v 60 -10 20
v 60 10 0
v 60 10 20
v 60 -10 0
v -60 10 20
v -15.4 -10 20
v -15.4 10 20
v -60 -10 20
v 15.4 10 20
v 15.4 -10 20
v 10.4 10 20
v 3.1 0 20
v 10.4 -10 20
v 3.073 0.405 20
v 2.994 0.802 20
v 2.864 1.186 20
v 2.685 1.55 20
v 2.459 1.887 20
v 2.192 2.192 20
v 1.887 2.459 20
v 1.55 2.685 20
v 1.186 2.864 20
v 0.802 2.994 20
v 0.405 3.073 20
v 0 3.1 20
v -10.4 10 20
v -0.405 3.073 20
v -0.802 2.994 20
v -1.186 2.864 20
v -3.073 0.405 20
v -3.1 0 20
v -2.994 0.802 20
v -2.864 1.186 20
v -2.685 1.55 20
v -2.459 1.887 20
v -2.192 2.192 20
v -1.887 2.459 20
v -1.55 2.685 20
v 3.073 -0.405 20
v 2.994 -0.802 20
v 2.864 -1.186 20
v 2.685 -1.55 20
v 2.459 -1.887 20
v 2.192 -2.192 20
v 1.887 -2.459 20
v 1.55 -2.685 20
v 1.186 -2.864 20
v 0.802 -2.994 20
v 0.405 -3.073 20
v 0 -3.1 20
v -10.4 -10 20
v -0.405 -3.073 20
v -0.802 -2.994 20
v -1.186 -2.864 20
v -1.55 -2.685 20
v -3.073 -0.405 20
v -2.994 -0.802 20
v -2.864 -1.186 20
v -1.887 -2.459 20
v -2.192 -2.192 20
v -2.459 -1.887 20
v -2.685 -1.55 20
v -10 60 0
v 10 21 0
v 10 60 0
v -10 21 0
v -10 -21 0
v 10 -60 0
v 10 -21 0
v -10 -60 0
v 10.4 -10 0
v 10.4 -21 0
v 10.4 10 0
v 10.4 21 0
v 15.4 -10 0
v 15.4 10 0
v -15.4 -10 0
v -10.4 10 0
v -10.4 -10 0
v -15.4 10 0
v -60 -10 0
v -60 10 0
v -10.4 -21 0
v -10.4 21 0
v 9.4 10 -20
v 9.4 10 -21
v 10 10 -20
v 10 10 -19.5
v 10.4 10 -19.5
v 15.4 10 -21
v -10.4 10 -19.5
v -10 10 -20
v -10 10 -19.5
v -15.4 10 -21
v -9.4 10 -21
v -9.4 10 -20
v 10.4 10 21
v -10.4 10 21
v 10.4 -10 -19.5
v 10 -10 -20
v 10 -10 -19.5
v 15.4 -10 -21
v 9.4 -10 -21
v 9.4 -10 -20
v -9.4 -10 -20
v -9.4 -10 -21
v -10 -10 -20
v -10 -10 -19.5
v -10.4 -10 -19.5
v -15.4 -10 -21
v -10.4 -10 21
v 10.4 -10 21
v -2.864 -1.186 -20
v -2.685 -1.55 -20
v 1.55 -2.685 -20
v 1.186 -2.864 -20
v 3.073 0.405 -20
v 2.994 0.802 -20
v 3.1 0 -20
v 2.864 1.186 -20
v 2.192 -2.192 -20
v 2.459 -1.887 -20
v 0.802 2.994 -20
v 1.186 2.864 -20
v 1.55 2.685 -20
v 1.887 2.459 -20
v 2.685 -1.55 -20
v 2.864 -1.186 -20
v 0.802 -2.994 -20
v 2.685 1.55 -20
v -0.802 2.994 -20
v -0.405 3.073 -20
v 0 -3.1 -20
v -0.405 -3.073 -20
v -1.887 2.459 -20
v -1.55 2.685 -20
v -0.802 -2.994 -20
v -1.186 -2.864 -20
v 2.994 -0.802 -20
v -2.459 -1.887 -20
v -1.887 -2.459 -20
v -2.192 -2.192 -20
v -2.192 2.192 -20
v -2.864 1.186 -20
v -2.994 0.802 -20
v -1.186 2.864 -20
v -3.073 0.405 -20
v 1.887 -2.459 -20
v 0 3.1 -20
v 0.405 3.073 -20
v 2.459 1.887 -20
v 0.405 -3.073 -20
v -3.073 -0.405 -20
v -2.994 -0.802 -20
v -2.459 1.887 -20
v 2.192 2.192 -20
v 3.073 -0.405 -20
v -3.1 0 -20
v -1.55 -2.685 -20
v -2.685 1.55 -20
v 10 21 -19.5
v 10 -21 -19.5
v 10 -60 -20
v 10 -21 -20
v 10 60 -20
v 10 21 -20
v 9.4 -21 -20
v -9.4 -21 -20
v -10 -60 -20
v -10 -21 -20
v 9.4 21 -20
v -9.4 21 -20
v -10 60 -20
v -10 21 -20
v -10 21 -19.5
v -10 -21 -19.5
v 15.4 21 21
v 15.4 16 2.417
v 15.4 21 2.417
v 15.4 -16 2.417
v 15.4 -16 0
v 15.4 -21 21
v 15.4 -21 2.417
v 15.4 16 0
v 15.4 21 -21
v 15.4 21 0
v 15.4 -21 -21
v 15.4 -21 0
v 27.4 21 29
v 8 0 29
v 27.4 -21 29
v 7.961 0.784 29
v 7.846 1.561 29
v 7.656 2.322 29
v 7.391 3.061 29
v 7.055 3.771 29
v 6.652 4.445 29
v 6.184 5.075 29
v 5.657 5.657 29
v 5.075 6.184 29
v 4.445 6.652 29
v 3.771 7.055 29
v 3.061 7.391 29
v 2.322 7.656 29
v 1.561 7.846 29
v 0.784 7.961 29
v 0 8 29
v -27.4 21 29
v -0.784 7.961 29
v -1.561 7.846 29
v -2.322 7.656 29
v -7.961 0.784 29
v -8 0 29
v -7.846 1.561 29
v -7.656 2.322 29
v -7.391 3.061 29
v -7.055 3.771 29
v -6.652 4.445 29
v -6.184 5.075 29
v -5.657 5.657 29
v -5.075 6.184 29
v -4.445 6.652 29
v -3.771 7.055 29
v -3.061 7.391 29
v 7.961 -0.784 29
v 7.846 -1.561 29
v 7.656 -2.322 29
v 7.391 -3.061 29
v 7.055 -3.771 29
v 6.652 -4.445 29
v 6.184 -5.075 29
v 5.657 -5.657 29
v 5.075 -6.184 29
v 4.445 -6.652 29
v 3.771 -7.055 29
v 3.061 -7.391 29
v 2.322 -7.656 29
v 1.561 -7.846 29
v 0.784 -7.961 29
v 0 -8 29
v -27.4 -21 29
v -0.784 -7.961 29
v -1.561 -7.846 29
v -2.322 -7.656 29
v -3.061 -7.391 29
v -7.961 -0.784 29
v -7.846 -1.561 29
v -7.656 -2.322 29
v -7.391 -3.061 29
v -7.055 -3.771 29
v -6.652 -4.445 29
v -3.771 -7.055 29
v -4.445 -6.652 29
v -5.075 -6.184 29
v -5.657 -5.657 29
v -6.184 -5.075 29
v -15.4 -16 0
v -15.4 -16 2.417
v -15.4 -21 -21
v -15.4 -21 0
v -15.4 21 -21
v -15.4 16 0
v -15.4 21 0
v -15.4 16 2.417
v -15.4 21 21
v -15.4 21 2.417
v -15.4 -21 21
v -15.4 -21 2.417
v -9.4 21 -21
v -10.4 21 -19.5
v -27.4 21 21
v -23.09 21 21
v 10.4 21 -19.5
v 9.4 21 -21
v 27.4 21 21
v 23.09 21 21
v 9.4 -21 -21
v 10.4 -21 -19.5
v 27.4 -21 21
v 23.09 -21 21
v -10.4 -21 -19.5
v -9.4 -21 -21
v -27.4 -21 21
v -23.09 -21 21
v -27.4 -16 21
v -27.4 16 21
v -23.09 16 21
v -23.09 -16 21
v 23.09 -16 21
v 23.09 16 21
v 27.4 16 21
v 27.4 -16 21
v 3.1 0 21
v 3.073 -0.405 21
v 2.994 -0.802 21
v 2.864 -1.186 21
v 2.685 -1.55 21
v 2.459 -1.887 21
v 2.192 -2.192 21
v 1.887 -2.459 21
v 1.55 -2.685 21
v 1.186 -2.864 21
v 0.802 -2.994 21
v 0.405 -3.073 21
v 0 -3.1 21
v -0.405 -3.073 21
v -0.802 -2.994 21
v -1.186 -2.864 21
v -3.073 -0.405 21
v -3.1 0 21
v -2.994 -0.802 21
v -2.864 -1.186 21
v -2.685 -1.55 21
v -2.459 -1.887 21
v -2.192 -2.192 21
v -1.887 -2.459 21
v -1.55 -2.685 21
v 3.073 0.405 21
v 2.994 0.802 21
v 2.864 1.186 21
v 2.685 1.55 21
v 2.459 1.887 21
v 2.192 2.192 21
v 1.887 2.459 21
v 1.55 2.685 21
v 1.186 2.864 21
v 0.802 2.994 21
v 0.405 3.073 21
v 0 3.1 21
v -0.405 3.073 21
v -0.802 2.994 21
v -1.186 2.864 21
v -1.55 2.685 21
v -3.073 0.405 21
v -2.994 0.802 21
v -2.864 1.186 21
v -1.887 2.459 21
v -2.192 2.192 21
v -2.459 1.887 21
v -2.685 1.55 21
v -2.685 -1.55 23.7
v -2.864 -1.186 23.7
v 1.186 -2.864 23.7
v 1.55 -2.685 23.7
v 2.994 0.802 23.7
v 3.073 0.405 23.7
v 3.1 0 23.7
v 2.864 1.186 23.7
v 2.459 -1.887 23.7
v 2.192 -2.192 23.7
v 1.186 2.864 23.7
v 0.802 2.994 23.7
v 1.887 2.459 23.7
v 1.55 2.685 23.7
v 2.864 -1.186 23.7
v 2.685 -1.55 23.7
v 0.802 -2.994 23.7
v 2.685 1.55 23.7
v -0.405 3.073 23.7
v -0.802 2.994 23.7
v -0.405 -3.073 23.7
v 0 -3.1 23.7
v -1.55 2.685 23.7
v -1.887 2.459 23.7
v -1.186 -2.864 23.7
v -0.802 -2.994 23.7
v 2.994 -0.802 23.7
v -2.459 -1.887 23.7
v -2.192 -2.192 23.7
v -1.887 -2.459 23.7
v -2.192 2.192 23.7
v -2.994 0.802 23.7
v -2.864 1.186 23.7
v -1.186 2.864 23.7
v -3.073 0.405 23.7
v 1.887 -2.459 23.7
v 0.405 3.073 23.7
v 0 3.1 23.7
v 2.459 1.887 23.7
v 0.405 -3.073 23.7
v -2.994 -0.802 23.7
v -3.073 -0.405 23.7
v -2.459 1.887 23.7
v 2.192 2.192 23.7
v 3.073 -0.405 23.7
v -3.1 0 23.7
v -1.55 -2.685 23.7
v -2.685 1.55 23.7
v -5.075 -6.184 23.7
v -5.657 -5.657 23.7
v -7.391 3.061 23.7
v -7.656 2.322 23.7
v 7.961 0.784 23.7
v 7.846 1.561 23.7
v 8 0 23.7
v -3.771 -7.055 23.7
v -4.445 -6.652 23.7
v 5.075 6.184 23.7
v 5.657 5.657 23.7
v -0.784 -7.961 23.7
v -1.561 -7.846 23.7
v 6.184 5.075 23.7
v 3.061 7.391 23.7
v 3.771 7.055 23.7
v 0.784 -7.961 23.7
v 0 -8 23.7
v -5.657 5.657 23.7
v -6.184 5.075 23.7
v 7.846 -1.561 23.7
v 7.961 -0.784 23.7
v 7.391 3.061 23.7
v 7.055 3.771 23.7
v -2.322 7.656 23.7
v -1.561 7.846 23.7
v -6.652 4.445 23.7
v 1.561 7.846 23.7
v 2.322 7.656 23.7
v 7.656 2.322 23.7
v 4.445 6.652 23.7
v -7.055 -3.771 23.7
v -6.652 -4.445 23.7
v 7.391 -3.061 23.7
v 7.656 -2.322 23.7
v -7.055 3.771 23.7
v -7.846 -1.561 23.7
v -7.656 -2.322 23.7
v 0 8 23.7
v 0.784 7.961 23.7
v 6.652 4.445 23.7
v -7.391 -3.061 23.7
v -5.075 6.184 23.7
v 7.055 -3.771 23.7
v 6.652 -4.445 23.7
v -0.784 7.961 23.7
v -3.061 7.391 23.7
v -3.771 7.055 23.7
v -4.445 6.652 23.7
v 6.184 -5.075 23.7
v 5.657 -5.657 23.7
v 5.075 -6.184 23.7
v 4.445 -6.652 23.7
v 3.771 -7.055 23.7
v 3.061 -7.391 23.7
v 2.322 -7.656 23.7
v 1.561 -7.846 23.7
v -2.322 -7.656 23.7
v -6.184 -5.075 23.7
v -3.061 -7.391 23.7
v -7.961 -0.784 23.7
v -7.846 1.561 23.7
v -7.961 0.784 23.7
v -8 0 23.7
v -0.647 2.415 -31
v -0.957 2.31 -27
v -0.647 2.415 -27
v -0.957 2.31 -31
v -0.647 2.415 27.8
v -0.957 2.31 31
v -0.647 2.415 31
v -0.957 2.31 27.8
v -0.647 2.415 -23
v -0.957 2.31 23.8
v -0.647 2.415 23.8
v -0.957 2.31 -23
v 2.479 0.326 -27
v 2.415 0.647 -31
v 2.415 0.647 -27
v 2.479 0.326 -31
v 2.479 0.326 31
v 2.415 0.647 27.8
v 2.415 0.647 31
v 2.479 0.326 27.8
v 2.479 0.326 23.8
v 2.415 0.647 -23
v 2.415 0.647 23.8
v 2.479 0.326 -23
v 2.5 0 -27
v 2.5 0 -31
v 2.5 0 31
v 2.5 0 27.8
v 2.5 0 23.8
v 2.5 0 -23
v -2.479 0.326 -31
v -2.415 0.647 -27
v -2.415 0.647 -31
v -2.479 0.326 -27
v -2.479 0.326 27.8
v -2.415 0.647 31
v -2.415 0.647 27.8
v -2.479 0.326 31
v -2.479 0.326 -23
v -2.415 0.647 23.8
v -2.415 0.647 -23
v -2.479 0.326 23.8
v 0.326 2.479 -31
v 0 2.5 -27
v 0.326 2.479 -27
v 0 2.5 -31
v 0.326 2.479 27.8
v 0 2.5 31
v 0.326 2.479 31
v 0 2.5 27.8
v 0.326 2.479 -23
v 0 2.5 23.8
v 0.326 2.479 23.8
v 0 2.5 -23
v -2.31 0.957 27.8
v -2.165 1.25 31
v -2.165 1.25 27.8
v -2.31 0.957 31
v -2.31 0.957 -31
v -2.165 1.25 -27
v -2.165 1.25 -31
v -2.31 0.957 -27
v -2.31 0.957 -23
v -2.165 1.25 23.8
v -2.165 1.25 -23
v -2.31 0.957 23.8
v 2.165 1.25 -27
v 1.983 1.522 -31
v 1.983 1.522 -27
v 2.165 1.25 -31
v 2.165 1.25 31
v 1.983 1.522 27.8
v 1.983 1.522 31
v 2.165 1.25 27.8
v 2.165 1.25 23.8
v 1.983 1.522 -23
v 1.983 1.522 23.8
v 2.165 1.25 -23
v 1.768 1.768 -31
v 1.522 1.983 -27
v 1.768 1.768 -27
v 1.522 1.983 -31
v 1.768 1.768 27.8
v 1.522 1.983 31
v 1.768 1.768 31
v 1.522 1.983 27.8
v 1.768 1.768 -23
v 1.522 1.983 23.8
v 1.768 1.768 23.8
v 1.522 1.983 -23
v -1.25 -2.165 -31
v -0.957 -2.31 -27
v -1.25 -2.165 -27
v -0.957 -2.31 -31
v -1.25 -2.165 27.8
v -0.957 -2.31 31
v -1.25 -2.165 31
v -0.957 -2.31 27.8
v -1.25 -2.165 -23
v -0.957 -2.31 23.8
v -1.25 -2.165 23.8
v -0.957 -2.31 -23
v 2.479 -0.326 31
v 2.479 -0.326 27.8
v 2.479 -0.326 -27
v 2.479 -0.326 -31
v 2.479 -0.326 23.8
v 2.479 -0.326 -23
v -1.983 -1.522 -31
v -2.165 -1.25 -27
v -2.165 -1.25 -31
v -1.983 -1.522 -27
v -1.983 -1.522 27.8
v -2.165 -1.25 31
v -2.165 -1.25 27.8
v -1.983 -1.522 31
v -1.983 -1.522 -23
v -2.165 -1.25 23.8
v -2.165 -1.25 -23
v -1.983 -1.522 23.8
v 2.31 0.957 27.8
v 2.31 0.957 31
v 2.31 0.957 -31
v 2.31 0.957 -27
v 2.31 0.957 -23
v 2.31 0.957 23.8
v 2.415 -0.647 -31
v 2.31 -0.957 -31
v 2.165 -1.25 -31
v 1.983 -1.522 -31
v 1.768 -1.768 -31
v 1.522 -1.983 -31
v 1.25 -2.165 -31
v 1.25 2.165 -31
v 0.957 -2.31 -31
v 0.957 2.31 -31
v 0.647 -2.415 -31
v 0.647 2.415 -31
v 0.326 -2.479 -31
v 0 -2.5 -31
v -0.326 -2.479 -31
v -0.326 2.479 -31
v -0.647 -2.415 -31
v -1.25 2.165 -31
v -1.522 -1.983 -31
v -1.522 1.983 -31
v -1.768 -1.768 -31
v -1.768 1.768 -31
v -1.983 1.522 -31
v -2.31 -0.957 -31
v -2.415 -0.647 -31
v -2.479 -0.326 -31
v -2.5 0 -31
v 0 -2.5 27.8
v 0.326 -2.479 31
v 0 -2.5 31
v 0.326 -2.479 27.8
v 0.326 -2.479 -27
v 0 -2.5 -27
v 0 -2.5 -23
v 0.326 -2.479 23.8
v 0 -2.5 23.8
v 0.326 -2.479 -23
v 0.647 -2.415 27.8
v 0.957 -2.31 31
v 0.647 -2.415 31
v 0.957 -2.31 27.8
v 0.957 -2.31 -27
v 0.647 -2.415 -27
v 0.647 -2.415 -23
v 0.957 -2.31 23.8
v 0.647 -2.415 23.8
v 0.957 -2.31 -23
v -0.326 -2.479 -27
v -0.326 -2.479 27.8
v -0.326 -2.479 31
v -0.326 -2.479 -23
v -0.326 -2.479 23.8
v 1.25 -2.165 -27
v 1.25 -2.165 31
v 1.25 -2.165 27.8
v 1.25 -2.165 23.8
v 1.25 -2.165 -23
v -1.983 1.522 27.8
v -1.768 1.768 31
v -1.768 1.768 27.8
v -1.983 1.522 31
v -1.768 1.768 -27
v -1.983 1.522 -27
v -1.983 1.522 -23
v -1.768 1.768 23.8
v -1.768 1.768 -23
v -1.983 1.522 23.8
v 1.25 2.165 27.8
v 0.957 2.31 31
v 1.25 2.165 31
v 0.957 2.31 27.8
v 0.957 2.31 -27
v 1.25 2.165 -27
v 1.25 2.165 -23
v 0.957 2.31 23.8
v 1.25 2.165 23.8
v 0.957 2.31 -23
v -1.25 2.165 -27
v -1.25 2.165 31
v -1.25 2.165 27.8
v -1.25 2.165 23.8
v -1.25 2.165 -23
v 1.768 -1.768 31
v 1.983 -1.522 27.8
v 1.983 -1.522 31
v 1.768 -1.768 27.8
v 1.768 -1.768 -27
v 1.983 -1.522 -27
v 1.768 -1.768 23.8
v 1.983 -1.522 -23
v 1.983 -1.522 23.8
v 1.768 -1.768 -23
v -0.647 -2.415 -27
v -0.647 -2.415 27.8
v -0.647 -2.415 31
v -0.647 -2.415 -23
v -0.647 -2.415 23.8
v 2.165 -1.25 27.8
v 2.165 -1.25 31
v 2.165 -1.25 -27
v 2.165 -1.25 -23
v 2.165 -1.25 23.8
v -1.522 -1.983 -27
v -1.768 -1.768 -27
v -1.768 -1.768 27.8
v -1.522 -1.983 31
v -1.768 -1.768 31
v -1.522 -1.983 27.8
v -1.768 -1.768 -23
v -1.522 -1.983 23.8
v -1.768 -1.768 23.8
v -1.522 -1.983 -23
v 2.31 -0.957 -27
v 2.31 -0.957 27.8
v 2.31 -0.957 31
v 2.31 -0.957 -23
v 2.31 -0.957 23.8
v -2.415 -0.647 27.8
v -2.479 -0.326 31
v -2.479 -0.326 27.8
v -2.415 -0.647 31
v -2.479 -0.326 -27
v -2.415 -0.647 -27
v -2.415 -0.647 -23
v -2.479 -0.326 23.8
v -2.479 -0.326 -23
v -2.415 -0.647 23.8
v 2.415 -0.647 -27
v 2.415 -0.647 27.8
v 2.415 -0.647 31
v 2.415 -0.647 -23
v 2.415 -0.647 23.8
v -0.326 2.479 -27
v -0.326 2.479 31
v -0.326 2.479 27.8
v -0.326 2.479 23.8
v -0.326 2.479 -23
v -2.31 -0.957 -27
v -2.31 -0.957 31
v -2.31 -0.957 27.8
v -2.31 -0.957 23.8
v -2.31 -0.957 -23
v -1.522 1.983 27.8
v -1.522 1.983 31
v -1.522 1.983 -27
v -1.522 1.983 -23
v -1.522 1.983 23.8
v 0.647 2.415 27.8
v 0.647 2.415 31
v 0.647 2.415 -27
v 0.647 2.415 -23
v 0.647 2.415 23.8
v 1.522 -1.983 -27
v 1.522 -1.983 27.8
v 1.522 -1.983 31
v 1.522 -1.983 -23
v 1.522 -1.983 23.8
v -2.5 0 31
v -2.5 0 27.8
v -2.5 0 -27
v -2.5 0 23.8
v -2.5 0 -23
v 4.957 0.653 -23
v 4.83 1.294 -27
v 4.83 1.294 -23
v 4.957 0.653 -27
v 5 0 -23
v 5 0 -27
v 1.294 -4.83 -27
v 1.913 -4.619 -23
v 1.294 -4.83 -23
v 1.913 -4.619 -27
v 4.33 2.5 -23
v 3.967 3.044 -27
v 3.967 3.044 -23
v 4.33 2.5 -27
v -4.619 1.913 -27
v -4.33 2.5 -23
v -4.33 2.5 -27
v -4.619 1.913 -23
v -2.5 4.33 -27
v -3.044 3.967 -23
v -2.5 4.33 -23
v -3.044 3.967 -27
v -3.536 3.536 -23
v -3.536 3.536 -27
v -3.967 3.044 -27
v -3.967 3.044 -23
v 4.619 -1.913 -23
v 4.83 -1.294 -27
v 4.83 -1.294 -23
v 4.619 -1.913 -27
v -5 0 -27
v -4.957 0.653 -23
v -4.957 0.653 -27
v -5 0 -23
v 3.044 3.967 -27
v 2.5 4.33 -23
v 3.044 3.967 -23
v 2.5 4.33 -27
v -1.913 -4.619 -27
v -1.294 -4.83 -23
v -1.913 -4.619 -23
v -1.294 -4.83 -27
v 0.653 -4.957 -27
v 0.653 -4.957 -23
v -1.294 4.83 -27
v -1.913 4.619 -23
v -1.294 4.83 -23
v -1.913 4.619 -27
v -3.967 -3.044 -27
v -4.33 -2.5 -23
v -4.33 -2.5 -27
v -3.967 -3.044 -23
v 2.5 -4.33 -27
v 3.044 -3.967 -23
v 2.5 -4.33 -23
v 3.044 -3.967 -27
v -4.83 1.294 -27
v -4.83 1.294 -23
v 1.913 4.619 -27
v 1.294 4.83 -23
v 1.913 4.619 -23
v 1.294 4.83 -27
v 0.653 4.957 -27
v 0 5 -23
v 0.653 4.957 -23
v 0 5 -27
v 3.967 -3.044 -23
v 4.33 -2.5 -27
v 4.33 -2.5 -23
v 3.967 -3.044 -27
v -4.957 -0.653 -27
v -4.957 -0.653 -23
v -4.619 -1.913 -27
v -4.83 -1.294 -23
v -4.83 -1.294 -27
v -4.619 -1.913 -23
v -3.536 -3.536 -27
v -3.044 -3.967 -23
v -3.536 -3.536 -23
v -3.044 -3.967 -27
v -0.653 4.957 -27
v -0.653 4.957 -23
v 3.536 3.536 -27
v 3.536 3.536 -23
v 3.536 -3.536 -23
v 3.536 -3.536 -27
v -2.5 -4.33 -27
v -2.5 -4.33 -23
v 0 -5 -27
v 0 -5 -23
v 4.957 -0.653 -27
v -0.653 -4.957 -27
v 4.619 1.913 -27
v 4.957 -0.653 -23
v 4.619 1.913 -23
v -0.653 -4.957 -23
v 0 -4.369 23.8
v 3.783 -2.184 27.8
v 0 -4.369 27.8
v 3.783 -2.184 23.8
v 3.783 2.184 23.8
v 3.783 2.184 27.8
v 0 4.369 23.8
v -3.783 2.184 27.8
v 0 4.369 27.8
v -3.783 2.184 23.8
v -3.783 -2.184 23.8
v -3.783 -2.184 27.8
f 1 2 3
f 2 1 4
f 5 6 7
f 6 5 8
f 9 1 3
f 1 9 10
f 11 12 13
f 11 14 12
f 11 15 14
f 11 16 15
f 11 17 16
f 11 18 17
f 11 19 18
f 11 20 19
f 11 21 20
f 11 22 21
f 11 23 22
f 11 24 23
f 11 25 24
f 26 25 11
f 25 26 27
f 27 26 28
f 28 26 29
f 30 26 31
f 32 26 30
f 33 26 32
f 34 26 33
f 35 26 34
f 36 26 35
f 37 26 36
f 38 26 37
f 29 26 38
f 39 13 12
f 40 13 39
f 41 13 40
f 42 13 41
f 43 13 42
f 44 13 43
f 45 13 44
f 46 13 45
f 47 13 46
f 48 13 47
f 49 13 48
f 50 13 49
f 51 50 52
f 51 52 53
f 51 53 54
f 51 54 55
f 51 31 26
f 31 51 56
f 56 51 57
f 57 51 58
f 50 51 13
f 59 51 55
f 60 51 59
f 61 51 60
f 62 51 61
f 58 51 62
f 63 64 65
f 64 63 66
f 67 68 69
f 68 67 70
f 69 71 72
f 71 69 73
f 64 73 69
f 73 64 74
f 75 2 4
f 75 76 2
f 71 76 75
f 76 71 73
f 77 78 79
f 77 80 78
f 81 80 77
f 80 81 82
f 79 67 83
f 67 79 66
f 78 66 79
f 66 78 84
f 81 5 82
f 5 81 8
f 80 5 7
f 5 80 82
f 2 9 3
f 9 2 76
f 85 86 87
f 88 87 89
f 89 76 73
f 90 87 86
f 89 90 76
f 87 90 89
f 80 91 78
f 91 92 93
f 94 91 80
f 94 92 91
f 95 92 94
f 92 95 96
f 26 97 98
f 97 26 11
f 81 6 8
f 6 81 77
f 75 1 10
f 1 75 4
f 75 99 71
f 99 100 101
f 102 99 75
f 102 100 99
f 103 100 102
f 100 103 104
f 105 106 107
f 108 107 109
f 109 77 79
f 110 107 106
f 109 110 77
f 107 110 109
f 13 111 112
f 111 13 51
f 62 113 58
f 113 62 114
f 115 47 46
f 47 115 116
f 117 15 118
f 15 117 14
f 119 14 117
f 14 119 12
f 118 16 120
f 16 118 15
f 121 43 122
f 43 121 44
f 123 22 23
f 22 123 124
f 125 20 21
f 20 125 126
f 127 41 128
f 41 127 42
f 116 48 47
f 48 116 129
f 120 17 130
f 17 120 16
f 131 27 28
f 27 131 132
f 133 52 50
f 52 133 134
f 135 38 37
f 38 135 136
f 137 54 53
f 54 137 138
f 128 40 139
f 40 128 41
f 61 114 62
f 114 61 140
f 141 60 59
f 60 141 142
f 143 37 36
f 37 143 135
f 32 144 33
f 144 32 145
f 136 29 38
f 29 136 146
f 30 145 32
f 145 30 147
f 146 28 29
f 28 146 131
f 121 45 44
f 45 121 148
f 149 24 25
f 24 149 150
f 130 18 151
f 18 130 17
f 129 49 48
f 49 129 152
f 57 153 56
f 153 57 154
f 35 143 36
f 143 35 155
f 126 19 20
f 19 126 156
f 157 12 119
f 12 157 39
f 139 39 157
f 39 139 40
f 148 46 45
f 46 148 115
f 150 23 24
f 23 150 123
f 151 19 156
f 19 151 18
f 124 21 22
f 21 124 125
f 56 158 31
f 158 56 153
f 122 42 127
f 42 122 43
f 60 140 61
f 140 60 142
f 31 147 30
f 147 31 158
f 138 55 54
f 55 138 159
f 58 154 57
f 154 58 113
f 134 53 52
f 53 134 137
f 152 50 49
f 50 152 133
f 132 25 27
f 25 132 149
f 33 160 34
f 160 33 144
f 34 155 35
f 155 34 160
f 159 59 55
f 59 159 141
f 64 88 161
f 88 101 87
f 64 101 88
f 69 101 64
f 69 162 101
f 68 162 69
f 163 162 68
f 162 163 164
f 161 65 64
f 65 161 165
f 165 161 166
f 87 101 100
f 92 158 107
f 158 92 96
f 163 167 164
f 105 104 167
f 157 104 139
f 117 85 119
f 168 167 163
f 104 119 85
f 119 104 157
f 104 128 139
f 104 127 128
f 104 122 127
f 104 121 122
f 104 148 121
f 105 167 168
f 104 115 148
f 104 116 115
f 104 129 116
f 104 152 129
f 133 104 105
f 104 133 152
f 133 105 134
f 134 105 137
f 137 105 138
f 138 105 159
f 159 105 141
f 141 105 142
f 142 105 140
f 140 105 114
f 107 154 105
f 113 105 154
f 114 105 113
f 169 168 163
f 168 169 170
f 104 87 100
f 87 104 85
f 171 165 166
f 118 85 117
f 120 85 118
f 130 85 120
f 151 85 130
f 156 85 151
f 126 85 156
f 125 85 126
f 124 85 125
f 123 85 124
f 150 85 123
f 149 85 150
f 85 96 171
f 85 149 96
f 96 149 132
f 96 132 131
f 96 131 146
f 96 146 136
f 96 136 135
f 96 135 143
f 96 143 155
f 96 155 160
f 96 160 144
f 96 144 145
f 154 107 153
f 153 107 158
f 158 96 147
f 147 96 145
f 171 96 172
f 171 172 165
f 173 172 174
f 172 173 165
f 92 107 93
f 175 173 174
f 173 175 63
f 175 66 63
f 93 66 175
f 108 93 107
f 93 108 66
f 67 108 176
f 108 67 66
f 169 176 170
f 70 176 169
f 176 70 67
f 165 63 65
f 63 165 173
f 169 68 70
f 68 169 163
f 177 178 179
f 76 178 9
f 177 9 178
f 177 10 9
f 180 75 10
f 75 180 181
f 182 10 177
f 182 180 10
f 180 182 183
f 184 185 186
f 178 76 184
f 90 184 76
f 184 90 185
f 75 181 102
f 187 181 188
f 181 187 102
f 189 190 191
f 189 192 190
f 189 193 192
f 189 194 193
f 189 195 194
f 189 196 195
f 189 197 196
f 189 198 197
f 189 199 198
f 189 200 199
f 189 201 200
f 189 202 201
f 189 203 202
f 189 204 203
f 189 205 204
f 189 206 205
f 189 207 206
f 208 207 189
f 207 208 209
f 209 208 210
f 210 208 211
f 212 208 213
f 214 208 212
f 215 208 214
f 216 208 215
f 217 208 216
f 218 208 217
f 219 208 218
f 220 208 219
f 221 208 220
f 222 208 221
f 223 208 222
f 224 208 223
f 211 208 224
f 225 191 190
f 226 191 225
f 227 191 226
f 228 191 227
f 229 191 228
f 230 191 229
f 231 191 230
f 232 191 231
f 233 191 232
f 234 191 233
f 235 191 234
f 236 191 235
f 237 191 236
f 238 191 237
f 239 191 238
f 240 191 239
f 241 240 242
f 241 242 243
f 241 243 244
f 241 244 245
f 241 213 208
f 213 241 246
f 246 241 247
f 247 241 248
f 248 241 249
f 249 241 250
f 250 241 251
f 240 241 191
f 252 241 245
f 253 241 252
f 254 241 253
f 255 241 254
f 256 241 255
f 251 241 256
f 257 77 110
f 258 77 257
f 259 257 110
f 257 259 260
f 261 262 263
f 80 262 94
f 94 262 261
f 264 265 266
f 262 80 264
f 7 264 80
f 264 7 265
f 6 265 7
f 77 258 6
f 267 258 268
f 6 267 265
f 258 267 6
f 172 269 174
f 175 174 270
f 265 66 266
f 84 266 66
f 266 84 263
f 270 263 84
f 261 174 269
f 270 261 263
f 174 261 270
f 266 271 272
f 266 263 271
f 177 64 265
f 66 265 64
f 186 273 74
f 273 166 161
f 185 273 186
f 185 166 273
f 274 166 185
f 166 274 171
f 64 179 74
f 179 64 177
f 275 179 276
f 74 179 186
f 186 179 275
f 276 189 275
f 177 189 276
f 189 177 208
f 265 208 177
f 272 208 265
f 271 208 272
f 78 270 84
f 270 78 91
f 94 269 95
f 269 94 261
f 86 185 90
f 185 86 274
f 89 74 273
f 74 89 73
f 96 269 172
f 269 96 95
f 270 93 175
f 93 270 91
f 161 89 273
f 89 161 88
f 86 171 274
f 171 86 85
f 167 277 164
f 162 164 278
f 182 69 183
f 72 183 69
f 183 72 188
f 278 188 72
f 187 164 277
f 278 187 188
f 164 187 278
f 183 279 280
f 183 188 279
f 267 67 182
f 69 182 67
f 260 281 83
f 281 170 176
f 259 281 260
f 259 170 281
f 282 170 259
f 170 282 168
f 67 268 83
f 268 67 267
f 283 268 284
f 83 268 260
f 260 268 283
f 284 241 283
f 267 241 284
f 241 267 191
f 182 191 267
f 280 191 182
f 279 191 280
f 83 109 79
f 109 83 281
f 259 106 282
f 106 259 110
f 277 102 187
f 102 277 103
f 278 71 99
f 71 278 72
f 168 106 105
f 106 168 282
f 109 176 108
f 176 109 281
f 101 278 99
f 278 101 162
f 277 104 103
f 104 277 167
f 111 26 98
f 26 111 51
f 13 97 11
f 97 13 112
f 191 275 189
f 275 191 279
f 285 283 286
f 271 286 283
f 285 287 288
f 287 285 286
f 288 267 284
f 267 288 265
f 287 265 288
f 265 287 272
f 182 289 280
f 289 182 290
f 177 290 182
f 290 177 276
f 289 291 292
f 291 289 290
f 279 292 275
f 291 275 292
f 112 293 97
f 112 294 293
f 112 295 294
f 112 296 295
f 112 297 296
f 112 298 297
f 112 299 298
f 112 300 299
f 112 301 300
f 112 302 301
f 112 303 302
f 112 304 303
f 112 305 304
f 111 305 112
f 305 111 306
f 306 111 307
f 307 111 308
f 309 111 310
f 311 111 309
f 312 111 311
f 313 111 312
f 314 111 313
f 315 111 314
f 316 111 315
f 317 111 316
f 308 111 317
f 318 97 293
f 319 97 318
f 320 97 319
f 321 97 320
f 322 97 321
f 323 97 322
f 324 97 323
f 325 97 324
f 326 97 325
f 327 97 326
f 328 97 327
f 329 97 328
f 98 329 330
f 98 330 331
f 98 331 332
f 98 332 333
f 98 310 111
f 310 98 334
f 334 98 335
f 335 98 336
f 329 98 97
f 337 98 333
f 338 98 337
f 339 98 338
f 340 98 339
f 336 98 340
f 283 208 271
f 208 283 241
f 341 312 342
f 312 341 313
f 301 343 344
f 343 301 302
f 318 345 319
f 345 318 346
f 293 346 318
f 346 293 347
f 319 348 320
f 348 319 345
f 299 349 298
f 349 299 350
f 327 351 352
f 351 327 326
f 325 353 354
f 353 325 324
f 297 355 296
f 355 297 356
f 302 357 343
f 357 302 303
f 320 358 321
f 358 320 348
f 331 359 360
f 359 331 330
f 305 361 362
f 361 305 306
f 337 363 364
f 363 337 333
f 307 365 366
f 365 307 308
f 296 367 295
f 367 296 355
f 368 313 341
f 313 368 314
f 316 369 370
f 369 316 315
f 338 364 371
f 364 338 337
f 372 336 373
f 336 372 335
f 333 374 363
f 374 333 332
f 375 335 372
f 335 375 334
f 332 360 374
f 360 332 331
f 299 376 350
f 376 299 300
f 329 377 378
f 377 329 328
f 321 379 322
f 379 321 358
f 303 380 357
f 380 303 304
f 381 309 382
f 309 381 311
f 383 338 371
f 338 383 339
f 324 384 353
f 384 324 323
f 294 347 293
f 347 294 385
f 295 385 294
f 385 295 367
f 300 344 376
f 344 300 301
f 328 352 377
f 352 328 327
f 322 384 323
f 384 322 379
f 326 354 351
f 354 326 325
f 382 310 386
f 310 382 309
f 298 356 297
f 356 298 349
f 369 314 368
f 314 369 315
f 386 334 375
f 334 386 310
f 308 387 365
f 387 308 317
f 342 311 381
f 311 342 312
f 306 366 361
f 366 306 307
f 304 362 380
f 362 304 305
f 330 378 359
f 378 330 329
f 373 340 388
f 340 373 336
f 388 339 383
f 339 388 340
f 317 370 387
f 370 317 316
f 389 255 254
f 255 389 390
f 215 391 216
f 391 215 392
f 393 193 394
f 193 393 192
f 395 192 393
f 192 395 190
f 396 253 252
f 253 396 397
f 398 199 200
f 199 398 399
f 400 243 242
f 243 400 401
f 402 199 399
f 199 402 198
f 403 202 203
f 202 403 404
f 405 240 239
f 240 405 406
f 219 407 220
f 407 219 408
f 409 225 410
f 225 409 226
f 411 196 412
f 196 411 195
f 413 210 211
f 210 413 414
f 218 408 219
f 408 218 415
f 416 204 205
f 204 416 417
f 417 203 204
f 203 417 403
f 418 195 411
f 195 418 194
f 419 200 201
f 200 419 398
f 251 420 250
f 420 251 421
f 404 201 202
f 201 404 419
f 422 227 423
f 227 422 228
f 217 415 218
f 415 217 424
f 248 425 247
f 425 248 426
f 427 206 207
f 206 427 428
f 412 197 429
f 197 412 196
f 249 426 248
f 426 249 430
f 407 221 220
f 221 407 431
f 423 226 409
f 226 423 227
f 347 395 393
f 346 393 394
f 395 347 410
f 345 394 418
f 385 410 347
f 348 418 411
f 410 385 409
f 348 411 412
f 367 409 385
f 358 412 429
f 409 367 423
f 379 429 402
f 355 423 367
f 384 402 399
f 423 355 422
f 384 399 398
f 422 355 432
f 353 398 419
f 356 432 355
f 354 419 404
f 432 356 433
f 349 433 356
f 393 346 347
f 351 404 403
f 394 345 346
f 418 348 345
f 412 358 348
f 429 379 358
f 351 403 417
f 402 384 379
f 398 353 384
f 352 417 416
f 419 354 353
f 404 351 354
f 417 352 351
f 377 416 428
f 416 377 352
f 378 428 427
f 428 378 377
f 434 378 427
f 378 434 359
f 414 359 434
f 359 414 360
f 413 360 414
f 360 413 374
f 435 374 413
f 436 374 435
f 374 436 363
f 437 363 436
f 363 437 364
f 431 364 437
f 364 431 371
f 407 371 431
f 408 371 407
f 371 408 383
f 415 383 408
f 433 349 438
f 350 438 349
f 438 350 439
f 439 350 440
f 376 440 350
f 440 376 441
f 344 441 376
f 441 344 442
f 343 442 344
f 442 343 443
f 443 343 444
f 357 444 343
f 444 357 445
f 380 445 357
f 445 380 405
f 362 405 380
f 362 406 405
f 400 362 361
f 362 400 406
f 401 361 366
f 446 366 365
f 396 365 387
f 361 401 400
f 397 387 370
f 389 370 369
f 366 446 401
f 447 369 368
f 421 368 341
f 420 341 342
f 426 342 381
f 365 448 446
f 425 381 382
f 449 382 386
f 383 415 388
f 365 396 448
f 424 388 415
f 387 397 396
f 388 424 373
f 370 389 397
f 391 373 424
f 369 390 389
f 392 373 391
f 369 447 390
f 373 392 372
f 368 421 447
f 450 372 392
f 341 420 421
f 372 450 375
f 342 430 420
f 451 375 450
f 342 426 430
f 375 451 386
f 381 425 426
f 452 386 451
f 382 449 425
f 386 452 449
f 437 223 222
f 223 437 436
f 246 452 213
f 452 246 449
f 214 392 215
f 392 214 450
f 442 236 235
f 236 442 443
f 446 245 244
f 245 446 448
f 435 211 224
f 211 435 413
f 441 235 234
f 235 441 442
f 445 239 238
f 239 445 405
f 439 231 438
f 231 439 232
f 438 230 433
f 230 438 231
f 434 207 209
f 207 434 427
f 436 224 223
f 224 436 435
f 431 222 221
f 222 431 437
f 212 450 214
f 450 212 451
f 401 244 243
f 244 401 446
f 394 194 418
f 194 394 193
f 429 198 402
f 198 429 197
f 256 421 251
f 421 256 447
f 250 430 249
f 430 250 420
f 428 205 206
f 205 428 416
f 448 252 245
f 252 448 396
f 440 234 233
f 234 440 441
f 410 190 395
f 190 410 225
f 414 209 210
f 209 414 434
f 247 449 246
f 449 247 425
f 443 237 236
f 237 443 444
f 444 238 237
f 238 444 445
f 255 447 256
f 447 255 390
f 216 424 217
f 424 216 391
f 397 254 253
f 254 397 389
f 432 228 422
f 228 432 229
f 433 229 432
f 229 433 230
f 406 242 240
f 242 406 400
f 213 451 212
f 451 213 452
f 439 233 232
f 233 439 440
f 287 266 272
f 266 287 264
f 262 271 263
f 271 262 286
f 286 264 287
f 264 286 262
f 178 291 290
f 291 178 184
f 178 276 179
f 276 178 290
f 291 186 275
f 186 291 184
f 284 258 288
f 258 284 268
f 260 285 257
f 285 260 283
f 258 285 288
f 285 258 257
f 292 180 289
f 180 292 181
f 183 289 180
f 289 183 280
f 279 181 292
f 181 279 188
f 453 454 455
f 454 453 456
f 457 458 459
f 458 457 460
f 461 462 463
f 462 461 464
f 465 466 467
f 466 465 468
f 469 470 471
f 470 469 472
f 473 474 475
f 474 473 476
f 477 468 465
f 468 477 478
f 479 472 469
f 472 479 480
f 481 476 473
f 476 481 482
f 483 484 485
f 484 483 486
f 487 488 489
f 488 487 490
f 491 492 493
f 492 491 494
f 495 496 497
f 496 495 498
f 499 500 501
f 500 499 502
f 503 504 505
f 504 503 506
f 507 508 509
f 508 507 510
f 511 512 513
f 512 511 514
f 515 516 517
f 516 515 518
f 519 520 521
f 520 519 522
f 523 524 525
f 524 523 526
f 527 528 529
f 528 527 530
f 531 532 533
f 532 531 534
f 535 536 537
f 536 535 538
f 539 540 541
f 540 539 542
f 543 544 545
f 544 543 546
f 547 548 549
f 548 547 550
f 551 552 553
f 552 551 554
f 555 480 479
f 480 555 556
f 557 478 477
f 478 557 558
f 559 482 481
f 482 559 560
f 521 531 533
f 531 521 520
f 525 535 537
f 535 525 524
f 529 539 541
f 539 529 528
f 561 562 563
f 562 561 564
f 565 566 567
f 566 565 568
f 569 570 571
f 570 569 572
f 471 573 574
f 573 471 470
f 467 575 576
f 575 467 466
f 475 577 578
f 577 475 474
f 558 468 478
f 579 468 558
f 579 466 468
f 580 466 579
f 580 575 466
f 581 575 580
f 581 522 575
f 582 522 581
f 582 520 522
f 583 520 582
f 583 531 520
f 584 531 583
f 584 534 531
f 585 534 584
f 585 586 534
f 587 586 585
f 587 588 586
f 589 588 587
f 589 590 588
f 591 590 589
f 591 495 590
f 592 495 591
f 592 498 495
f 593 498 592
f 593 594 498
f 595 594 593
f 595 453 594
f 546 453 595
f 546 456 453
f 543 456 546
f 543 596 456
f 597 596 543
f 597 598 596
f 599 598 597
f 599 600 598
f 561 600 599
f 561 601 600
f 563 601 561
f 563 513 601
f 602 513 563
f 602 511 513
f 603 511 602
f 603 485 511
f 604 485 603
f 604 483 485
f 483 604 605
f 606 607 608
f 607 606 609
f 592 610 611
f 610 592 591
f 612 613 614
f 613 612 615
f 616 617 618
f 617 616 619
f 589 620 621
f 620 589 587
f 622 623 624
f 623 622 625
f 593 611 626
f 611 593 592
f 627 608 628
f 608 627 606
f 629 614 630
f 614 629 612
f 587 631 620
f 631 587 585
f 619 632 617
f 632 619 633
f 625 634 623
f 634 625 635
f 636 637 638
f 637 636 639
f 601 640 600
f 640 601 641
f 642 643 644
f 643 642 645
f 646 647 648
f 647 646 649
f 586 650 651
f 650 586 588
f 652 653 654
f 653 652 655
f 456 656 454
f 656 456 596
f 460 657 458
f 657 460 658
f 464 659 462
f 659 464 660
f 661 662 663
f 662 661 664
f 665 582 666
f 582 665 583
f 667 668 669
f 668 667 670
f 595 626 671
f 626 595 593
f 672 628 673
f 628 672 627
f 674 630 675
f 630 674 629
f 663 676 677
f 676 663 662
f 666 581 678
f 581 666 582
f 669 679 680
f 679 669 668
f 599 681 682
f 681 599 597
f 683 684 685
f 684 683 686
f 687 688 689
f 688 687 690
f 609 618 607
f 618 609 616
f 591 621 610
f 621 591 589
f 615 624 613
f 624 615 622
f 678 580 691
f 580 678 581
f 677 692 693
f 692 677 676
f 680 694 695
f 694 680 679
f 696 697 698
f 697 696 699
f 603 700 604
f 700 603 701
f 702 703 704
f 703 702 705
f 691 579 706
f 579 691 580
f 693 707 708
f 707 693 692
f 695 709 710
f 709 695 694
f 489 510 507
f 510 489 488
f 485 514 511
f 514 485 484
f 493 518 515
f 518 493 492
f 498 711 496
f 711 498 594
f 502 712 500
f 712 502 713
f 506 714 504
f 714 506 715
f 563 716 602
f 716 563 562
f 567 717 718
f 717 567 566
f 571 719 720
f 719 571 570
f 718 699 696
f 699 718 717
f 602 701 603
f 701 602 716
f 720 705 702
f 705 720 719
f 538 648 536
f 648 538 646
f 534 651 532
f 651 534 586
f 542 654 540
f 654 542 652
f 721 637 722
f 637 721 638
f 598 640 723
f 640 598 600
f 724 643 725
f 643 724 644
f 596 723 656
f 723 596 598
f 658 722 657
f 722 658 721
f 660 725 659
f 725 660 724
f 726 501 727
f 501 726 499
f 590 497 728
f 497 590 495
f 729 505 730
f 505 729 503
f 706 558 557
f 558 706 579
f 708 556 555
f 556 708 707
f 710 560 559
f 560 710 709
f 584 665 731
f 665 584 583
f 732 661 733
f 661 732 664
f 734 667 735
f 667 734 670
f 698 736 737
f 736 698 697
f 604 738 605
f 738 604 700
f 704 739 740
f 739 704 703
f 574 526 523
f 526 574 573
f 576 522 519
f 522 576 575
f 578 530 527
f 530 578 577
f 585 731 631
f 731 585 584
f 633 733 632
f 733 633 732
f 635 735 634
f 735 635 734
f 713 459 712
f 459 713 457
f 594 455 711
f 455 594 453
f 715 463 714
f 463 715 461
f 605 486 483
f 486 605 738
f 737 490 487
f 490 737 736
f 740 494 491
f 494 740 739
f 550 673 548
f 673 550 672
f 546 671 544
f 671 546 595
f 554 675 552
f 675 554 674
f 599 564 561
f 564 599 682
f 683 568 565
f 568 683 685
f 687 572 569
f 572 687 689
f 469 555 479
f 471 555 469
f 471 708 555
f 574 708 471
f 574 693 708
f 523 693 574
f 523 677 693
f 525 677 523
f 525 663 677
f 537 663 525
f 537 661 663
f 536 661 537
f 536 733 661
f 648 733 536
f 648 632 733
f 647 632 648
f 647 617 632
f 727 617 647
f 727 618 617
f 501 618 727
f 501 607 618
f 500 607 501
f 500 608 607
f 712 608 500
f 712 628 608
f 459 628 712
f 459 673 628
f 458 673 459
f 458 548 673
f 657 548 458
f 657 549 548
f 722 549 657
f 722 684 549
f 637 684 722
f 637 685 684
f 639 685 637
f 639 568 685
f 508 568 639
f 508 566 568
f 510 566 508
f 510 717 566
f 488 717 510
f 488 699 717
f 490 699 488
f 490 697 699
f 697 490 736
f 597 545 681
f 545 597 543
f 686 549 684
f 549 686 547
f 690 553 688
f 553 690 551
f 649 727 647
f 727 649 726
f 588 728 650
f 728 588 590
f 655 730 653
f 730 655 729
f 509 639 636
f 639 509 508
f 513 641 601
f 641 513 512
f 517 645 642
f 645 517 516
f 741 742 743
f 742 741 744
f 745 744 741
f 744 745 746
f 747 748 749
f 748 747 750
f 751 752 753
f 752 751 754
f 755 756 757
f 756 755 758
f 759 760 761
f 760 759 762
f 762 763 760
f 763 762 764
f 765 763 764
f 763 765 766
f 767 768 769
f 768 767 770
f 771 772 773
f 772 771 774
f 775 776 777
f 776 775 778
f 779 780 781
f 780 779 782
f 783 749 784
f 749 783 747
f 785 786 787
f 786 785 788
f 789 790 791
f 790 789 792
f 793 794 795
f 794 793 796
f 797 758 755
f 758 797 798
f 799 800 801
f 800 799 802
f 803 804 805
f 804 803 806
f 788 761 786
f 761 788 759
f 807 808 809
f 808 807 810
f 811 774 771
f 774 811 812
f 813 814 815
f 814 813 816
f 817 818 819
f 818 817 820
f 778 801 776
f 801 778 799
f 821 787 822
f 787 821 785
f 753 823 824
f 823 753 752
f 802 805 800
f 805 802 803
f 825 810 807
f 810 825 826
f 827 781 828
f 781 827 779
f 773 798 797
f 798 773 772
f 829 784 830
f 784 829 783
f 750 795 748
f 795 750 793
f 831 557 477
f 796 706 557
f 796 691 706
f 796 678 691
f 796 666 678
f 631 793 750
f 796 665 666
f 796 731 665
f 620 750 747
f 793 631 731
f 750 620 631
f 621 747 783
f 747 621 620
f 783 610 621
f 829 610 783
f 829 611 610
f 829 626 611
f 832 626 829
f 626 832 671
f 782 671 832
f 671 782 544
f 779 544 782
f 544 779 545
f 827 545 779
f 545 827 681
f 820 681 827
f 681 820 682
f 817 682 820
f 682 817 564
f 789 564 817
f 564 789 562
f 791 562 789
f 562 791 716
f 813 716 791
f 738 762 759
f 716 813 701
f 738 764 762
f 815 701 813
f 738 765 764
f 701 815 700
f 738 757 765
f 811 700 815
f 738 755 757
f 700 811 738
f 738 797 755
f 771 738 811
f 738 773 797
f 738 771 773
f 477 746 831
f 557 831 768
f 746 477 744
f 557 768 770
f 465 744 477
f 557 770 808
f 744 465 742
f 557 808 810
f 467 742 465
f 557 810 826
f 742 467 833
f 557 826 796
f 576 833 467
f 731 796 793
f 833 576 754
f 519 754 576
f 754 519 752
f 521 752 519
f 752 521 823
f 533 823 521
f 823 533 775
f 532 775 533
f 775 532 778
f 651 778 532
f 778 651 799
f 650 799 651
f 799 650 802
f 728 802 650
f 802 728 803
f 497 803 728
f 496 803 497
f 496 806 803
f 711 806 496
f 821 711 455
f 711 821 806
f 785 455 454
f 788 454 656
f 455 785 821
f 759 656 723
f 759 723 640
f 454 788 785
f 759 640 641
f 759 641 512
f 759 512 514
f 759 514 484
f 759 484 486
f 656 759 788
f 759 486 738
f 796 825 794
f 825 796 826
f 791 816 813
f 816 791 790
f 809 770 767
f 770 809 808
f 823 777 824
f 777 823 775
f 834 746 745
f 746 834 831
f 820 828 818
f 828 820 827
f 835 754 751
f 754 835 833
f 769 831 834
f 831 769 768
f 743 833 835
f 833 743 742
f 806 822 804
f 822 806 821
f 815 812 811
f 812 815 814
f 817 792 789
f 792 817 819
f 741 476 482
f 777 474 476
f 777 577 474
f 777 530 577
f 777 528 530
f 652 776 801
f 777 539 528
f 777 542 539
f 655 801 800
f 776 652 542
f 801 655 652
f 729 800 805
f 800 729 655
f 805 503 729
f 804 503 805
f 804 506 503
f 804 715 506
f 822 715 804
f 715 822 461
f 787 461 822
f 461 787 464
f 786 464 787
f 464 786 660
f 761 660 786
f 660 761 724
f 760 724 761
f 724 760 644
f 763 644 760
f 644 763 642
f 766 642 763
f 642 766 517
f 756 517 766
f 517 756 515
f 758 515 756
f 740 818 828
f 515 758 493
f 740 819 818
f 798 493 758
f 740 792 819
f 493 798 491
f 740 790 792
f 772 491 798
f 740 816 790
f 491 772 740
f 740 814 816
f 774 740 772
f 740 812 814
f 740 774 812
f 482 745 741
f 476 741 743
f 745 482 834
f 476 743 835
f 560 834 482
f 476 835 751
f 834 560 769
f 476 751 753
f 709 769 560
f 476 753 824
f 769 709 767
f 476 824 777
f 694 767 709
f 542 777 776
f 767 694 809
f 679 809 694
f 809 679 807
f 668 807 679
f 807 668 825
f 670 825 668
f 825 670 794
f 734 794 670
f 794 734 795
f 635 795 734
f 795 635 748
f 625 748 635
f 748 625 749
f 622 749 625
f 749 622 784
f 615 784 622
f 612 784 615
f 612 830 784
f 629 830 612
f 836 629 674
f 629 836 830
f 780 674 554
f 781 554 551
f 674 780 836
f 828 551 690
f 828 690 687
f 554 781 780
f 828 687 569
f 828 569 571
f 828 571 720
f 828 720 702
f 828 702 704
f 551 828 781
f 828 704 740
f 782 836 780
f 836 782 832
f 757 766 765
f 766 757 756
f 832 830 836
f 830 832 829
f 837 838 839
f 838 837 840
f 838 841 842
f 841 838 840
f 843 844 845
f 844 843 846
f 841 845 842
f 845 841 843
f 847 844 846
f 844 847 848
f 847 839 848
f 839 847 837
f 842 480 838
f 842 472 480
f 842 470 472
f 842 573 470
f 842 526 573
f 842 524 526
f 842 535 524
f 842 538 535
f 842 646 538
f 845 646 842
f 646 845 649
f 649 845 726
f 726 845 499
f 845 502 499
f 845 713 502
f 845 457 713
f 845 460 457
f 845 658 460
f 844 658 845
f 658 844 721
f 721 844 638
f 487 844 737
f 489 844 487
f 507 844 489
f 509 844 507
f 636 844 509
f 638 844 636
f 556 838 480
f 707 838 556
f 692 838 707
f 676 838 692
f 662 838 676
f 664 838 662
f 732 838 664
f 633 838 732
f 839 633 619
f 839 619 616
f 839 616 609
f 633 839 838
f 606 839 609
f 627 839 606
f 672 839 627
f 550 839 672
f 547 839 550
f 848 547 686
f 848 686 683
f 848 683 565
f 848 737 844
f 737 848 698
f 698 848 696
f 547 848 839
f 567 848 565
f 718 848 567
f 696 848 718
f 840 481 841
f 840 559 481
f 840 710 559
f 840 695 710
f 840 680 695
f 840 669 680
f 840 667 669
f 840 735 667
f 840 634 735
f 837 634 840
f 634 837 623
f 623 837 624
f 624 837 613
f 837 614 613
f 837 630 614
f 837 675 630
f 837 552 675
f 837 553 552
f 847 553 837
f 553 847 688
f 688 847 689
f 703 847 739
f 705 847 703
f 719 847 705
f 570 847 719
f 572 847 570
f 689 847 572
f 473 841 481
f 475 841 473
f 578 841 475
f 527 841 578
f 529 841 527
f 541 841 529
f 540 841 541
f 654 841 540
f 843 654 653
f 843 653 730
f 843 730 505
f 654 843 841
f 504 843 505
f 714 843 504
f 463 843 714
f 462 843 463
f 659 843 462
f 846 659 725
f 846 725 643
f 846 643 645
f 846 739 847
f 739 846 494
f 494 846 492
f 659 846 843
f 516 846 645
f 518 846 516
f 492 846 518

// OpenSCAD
// Candidate v1.0: four inward sloped solid walls.
//
// Base: accepted v0.7 eaves12 geometry.  v0.9's single outward wall is not
// imported and is not part of this candidate.
//
// Coordinate contract:
//   x = barrier long direction
//   y = front/back direction (+Y FRONT, -Y BACK)
//   z = vertical direction

use <../perpendicular-u-joint-guard-v0.7/perpendicular_double_u_guard.scad>;

$fn = 48;

PART = "candidate_iso";

// Explicit v0.7 interface values.  `use` imports the base modules, not its
// top-level variables, so the candidate keeps its interface dimensions here.
roof_x_outer = 27.4;       // roof x range is -27.4..+27.4; eaves12
side_wall_x_outer = 15.4;  // existing side-wall outer edge
material_thickness = 5.0;  // same as the existing U side-wall thickness
roof_z_bottom = 21.0;
roof_z_top = 29.0;
landing_z = 0.0;           // blue lower tube top / side-wall lower target
roof_overlap_x = 1.0;      // positive overlap into roof, toward the centre
side_overlap_x = 1.0;      // positive overlap into side wall, toward the centre
front_y_outer = 21.0;
back_y_outer = -21.0;
front_wall_yc = front_y_outer - material_thickness / 2;
back_wall_yc = back_y_outer + material_thickness / 2;

assert(landing_z == 0,
       "蓝色下方方管上表面及侧墙目标高度必须是 z=0");
assert(roof_overlap_x > 0 && side_overlap_x > 0,
       "四面斜墙必须与屋檐和侧墙都有正重叠");
assert(material_thickness == 5,
       "斜墙厚度沿用现有 5 mm 结构厚度");

// The polygon is an XZ trapezoid with finite overlap at both ends.  At the
// roof end it occupies x=-27.4..-26.4 (or the mirrored +X interval) through
// the roof's z=21..29 volume.  At the lower end it occupies a 1 mm-wide
// interval inside the corresponding existing side wall, so it is not merely
// tangent at an edge or a single point.
module sloped_wall_xz(points, yc) {
    translate([0, yc, 0])
        rotate([90, 0, 0])
            linear_extrude(height = material_thickness,
                           center = true,
                           convexity = 10)
                polygon(points = points);
}

module wall_front_neg_x() {
    sloped_wall_xz([
        [-roof_x_outer, roof_z_bottom],
        [-roof_x_outer, roof_z_top],
        [-roof_x_outer + roof_overlap_x, roof_z_top],
        [-side_wall_x_outer + side_overlap_x, landing_z],
        [-side_wall_x_outer, landing_z]
    ], front_wall_yc);
}

module wall_front_pos_x() {
    sloped_wall_xz([
        [roof_x_outer, roof_z_bottom],
        [roof_x_outer, roof_z_top],
        [roof_x_outer - roof_overlap_x, roof_z_top],
        [side_wall_x_outer - side_overlap_x, landing_z],
        [side_wall_x_outer, landing_z]
    ], front_wall_yc);
}

module wall_back_neg_x() {
    sloped_wall_xz([
        [-roof_x_outer, roof_z_bottom],
        [-roof_x_outer, roof_z_top],
        [-roof_x_outer + roof_overlap_x, roof_z_top],
        [-side_wall_x_outer + side_overlap_x, landing_z],
        [-side_wall_x_outer, landing_z]
    ], back_wall_yc);
}

module wall_back_pos_x() {
    sloped_wall_xz([
        [roof_x_outer, roof_z_bottom],
        [roof_x_outer, roof_z_top],
        [roof_x_outer - roof_overlap_x, roof_z_top],
        [side_wall_x_outer - side_overlap_x, landing_z],
        [side_wall_x_outer, landing_z]
    ], back_wall_yc);
}

module front_two_sloped_walls() {
    union() {
        wall_front_neg_x();
        wall_front_pos_x();
    }
}

module back_two_sloped_walls() {
    union() {
        wall_back_neg_x();
        wall_back_pos_x();
    }
}

module all_four_sloped_walls() {
    union() {
        front_two_sloped_walls();
        back_two_sloped_walls();
    }
}

module candidate_clip() {
    // One union: base v0.7 body plus four overlapping wall prisms.
    union() {
        double_u_clip();
        all_four_sloped_walls();
    }
}

module candidate_assembly_iso() {
    upper_long_tube();
    lower_cross_tube();
    color([0.96, 0.39, 0.08]) double_u_clip();
    color([0.86, 0.13, 0.08]) front_two_sloped_walls();
    color([0.62, 0.12, 0.52]) back_two_sloped_walls();
    vertical_joint_screw();
}

module candidate_front_xz() {
    // +Y FRONT only: both -X and +X walls are shown, with the gray tube
    // intentionally omitted from this XZ check view.
    lower_cross_tube();
    color([0.96, 0.39, 0.08]) double_u_clip();
    color([0.86, 0.13, 0.08]) front_two_sloped_walls();
    vertical_joint_screw();
}

module candidate_back_xz() {
    // -Y BACK only: mirror check of the same two inward walls.
    lower_cross_tube();
    color([0.96, 0.39, 0.08]) double_u_clip();
    color([0.62, 0.12, 0.52]) back_two_sloped_walls();
    vertical_joint_screw();
}

if (PART == "candidate_clip") {
    candidate_clip();
} else if (PART == "candidate_front_xz") {
    candidate_front_xz();
} else if (PART == "candidate_back_xz") {
    candidate_back_xz();
} else {
    candidate_assembly_iso();
}
